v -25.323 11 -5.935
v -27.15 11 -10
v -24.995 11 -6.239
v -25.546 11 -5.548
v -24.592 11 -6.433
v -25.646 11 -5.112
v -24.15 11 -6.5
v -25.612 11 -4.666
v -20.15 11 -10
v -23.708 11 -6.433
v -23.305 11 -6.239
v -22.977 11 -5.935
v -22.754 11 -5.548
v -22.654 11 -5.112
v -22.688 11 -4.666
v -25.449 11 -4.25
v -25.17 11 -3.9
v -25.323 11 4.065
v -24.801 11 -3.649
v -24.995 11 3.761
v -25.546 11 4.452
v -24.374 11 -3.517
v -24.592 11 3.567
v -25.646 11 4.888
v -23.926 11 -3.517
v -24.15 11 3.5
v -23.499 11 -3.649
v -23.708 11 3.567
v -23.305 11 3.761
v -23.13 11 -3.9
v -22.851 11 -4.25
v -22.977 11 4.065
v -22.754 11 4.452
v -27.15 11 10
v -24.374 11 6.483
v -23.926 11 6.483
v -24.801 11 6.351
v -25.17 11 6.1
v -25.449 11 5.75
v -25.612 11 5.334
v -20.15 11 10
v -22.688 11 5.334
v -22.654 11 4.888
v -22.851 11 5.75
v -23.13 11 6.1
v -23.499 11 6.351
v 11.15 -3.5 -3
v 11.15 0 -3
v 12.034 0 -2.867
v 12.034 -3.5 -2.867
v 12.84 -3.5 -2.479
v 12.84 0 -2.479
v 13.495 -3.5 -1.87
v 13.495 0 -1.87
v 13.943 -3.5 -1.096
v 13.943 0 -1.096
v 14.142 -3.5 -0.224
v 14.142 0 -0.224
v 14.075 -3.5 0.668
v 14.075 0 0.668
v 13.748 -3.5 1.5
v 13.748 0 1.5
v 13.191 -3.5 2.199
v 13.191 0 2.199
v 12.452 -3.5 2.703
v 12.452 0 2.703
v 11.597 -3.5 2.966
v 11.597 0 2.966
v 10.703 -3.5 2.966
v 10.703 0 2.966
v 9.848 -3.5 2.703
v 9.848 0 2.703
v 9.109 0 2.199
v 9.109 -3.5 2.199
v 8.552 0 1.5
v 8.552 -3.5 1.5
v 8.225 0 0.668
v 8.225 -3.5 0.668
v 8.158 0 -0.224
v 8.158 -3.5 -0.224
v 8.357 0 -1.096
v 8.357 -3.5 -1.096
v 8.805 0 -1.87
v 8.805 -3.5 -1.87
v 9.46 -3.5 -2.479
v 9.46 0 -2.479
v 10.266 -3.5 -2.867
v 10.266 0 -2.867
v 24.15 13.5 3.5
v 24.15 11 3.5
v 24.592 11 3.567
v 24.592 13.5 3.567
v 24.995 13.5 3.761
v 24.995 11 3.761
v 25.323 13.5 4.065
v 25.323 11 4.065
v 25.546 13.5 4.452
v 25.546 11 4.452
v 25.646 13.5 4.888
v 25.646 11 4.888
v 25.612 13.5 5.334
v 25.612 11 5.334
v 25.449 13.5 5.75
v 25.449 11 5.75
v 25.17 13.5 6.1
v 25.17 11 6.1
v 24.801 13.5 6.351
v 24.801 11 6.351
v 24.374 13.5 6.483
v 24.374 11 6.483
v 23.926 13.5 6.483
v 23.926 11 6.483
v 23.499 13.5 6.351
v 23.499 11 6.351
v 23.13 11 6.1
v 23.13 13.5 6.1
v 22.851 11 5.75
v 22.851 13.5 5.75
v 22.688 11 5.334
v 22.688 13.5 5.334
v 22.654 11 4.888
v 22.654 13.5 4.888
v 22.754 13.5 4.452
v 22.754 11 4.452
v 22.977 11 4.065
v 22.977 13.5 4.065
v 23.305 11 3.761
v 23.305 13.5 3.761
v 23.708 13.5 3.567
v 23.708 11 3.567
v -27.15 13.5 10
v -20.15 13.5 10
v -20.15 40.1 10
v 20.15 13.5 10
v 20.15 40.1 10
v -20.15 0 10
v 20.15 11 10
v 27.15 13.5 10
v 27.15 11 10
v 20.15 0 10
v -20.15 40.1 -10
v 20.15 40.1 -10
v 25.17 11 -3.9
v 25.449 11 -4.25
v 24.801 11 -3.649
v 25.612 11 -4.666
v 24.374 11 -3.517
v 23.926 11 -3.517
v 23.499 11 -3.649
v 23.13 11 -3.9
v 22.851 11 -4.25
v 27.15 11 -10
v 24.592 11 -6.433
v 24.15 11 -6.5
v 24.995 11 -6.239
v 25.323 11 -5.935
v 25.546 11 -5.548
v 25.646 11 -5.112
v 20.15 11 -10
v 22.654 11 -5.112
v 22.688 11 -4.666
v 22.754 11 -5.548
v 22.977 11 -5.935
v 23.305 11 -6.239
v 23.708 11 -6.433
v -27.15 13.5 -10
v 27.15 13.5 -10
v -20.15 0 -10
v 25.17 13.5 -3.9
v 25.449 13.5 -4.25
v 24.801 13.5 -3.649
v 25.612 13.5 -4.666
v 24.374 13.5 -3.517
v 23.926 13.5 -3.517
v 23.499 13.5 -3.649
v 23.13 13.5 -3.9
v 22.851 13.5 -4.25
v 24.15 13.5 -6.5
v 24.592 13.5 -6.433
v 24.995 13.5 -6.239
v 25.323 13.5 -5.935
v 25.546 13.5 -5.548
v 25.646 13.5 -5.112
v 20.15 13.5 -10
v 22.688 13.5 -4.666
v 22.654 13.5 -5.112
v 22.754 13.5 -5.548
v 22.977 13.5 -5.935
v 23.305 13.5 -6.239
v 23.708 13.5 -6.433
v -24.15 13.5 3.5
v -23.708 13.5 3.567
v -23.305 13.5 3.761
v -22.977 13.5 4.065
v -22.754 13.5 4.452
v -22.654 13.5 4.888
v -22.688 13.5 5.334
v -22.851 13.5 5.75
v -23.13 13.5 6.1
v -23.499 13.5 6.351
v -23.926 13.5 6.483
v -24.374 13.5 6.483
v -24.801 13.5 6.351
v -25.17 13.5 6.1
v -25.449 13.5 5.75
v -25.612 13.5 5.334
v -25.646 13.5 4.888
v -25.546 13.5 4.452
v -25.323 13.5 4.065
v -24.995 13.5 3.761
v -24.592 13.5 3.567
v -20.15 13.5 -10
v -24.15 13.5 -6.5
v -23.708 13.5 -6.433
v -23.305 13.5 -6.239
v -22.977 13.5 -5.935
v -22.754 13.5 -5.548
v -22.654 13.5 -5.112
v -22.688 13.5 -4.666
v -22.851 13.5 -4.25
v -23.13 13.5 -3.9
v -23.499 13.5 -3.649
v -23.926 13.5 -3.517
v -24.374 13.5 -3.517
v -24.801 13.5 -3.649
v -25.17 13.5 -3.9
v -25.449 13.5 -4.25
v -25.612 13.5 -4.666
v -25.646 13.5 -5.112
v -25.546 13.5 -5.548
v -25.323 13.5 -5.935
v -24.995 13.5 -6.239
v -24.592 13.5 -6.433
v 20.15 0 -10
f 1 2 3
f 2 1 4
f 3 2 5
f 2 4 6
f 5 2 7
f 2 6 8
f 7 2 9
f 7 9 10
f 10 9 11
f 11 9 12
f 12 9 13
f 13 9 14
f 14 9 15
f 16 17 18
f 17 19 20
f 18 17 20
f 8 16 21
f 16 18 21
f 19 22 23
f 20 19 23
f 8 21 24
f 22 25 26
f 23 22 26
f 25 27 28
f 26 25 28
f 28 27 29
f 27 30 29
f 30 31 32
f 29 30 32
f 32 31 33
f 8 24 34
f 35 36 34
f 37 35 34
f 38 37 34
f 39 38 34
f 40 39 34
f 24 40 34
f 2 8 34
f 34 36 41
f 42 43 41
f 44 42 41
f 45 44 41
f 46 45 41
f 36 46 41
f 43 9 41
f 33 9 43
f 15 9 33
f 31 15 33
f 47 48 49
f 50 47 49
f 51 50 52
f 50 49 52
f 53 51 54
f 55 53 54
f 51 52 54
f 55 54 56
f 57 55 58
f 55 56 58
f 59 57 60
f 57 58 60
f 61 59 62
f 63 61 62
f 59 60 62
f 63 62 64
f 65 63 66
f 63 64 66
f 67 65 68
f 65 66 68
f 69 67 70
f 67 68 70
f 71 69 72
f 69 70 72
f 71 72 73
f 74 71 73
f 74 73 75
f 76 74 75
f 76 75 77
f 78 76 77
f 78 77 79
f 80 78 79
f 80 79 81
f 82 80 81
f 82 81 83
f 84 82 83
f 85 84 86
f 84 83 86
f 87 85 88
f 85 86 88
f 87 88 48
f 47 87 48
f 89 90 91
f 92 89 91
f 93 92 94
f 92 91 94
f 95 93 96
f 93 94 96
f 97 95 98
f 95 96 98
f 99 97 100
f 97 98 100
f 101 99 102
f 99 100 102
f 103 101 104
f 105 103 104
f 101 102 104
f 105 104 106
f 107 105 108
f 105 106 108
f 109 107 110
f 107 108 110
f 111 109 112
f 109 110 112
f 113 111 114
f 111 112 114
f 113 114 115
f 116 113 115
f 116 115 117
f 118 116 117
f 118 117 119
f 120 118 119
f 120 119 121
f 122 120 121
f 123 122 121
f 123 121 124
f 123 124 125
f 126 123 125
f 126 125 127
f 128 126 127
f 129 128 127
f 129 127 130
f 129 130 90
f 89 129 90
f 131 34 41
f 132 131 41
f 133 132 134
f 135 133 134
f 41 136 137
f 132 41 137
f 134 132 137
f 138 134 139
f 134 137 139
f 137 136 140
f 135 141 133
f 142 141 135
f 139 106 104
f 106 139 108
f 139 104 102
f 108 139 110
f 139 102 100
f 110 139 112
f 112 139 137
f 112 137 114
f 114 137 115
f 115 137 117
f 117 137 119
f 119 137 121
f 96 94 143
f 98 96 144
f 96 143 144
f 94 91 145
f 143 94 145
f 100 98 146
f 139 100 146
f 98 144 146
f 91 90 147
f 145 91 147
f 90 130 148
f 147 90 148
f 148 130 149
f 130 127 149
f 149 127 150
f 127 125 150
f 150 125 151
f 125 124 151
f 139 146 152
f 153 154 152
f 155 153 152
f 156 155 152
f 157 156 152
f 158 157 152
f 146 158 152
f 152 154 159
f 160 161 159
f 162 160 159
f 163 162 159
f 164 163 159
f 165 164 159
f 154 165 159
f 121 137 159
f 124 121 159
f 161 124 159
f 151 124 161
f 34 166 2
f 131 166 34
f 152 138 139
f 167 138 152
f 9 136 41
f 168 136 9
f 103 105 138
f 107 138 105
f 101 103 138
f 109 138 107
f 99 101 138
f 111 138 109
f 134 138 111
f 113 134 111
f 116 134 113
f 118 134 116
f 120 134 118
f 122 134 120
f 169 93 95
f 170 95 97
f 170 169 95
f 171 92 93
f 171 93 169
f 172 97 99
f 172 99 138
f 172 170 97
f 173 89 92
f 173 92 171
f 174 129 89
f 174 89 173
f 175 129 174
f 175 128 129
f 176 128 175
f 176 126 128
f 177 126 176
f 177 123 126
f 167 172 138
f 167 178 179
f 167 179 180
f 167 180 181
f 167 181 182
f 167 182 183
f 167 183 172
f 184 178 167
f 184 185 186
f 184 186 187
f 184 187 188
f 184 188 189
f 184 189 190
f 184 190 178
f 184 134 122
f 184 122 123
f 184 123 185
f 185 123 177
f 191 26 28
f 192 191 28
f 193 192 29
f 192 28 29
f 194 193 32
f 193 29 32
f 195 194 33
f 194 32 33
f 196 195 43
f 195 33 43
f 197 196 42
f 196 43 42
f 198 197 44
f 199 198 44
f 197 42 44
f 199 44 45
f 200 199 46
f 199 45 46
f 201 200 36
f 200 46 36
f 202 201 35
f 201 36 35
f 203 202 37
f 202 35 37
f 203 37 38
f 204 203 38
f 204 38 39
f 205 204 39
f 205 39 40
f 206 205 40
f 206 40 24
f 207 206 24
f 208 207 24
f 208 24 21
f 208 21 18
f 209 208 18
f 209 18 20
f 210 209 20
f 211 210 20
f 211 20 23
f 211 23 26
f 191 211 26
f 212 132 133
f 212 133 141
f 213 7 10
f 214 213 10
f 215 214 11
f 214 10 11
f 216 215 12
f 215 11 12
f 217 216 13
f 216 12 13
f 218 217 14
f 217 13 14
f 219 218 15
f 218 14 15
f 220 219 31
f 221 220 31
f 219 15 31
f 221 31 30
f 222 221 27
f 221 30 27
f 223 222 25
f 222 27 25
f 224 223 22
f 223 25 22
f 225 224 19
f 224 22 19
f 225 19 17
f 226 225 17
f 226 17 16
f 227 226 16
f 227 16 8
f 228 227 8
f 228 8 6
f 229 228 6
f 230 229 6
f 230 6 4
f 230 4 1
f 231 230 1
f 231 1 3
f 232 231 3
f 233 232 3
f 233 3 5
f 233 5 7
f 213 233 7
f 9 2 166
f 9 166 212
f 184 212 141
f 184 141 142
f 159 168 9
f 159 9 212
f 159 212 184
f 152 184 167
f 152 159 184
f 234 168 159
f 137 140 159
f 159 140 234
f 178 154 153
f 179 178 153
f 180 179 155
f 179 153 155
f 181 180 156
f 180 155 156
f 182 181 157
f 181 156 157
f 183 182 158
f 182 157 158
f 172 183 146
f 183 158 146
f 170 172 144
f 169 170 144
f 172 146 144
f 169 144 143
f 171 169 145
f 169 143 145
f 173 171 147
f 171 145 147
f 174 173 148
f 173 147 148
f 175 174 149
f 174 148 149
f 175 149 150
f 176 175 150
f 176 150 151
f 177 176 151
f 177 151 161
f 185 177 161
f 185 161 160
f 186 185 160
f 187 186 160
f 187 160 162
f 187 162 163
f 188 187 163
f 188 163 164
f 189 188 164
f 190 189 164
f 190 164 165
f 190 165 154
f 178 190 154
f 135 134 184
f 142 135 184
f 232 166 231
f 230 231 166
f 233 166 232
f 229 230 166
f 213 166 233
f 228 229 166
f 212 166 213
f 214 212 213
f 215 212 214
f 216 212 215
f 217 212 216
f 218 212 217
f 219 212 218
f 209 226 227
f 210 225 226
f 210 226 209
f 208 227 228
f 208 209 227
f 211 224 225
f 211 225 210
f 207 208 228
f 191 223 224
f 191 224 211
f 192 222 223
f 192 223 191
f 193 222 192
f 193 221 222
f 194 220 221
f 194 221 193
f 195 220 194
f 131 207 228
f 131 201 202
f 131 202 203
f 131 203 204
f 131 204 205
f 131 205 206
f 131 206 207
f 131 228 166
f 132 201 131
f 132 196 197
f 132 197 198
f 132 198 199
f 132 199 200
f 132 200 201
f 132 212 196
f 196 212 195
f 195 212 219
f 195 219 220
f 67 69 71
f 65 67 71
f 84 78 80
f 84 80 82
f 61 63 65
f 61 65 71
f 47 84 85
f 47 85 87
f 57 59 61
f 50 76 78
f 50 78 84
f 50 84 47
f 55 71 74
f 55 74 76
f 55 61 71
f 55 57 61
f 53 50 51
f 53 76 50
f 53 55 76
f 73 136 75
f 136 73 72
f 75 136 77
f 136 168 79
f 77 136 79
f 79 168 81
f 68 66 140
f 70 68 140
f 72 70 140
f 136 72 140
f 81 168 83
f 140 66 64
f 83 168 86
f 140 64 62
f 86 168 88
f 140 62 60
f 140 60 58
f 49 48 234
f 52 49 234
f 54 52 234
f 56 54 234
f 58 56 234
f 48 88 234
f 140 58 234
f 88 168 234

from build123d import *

# Parameters (mm, degrees)
SKETCH1_W           = 40.3
SKETCH1_H           = 20
BOSS_EXTRUDE1_DEPTH = 40.1
SKETCH2_W           = 20
SKETCH2_H           = 2.5
BOSS_EXTRUDE2_DEPTH = 7
SKETCH3_W           = 20
SKETCH3_H           = 2.5
BOSS_EXTRUDE3_DEPTH = 7
SKETCH4_R           = 1.5
CUT_EXTRUDE1_DEPTH  = 7
SKETCH5_R           = 3
BOSS_EXTRUDE4_DEPTH = 3.5


with BuildPart() as part:
    # Sketch1 → Boss-Extrude1 (new body)
    with BuildSketch(Plane(origin=(0, 0, 0), x_dir=(1, 0, 0), z_dir=(0, 1, 0))):
        Rectangle(SKETCH1_W, SKETCH1_H)
    extrude(amount=BOSS_EXTRUDE1_DEPTH)

    # Sketch2 → Boss-Extrude2 (add)
    with BuildSketch(Plane(origin=(20.15, 0, 0), x_dir=(0, 0, -1), z_dir=(1, 0, 0))):
        with Locations((0, 12.25)):
            Rectangle(SKETCH2_W, SKETCH2_H)
    extrude(amount=BOSS_EXTRUDE2_DEPTH)

    # Sketch3 → Boss-Extrude3 (add)
    with BuildSketch(Plane.ZY.offset(20.15)):
        with Locations((0, 12.25)):
            Rectangle(SKETCH3_W, SKETCH3_H)
    extrude(amount=BOSS_EXTRUDE3_DEPTH)

    # Sketch4 → Cut-Extrude1 (cut)
    with BuildSketch(Plane.XZ.offset(-11)):
        with Locations((-24.15, 5)):
            Circle(SKETCH4_R)
        with Locations((-24.15, -5)):
            Circle(SKETCH4_R)
        with Locations((24.15, 5)):
            Circle(SKETCH4_R)
        with Locations((24.15, -5)):
            Circle(SKETCH4_R)
    extrude(amount=-CUT_EXTRUDE1_DEPTH, mode=Mode.SUBTRACT)

    # Sketch5 → Boss-Extrude4 (add)
    with BuildSketch(Plane.XZ):
        with Locations((11.15, 0)):
            Circle(SKETCH5_R)
    extrude(amount=BOSS_EXTRUDE4_DEPTH)


solid = part.part
